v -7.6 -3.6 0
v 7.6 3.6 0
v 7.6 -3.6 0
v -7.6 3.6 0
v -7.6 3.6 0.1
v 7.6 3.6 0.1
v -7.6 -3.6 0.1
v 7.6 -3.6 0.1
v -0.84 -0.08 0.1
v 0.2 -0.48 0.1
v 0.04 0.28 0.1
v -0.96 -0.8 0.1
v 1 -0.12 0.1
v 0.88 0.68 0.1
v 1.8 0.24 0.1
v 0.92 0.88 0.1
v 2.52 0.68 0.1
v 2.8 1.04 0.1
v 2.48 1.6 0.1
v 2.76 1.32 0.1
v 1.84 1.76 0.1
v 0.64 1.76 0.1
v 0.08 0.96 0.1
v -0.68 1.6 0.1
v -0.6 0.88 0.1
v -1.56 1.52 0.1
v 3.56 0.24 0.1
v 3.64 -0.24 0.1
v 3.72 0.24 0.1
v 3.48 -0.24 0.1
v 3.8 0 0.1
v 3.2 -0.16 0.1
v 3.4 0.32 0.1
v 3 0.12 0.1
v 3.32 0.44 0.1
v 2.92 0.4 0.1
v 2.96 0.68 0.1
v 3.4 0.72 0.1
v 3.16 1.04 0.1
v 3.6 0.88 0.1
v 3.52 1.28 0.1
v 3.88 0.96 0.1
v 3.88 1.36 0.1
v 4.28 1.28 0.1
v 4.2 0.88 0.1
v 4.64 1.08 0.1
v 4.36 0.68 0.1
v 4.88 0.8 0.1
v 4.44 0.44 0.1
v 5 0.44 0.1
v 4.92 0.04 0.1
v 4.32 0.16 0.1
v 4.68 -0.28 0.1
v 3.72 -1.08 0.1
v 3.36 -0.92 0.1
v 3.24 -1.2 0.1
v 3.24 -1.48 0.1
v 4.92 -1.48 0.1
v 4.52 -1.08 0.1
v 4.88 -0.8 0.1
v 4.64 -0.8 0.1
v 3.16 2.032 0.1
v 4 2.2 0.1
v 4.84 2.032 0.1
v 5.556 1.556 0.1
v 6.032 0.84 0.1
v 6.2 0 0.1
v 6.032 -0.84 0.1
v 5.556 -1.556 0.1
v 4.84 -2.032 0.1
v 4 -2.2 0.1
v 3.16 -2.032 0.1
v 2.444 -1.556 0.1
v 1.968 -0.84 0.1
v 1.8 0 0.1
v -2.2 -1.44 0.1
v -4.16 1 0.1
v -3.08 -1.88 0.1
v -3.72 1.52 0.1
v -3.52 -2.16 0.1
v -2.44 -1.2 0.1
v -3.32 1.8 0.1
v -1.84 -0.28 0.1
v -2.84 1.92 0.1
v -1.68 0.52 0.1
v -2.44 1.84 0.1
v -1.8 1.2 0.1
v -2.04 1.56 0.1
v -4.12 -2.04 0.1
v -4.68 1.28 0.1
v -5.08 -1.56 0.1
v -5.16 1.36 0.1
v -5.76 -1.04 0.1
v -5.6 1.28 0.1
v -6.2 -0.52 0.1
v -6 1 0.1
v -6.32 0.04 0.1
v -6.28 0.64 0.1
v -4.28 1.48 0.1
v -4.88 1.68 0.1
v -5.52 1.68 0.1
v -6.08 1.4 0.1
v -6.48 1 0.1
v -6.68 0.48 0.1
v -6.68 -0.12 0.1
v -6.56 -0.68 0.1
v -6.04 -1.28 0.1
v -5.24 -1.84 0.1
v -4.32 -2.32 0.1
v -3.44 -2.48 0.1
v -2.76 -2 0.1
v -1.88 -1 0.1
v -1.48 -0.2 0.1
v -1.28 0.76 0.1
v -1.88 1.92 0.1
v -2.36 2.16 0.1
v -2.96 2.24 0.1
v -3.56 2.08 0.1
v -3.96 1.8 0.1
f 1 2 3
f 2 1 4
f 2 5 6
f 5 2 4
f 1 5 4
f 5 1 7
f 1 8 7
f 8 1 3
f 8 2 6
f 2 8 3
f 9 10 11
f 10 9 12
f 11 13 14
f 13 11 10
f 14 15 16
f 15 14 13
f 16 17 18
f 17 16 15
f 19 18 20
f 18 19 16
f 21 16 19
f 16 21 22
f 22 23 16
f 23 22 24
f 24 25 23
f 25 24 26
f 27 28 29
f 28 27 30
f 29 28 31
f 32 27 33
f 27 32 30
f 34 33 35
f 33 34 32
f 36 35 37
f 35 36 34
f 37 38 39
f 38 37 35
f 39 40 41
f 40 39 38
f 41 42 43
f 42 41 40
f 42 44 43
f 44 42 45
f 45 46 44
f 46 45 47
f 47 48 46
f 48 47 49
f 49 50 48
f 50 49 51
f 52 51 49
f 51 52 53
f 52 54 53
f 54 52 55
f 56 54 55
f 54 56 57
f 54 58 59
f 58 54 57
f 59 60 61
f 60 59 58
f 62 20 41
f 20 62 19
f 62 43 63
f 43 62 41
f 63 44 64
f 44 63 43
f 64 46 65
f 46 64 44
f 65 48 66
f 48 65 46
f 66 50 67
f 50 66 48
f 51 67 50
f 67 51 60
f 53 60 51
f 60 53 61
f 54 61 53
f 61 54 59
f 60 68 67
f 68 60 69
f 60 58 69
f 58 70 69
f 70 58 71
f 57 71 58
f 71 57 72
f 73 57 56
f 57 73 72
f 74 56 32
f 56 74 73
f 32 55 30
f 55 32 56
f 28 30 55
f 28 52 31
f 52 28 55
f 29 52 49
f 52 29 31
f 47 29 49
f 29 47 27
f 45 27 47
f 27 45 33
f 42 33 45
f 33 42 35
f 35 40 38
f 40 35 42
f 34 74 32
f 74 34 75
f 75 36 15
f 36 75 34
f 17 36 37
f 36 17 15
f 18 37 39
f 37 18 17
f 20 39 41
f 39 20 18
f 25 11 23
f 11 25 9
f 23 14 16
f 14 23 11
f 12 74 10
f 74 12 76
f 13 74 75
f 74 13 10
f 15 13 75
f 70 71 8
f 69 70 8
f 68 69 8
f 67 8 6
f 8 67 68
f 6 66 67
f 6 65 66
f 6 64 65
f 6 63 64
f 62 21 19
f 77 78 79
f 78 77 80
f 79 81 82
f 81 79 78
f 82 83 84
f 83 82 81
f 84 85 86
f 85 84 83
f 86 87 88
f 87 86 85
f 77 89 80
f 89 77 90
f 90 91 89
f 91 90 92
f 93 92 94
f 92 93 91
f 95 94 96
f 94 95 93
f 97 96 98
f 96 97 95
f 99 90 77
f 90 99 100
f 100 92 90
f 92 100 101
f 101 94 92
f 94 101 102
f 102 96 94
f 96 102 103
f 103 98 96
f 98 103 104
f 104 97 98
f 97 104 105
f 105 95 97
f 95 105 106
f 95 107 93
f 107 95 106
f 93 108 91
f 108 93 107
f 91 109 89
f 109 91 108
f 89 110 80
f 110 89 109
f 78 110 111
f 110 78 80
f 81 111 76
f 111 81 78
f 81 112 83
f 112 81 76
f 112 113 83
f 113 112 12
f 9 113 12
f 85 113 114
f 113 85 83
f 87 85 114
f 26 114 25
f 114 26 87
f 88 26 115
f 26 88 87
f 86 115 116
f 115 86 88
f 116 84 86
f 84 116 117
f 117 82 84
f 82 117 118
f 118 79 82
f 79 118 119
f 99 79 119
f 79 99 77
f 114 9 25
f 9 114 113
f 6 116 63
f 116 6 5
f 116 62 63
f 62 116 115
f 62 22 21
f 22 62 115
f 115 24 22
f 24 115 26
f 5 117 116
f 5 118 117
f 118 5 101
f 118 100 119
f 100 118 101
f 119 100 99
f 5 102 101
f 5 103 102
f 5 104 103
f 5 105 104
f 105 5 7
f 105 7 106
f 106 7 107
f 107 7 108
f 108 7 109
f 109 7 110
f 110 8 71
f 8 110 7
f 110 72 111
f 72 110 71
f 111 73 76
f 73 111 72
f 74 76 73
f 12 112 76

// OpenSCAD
// file: ../p/box5-12.scad
use <../lib.scad>
function ldraw_lib__box5_12() = [
// 0 Box with 5 Faces without Any Edges
// 0 Name: box5-12.dat
// 0 Author: Chris Dee [cwdee]
// 0 !LDRAW_ORG Primitive UPDATE 2009-02
// 0 !LICENSE Licensed under CC BY 4.0 : see CAreadme.txt
// 
// 0 BFC CERTIFY CCW
  [0,"BFC","CERTIFY"],
  [0,"BFC","CCW"],
// 
// 0 !HISTORY 2009-09-03 [PTadmin] Official Update 2009-02
// 
// 
// 4 16 1 1 1 1 1 -1 -1 1 -1 -1 1 1
  [4,16,1,1,1,1,1,-1,-1,1,-1,-1,1,1],
// 4 16 -1 0 1 1 0 1 1 1 1 -1 1 1
  [4,16,-1,0,1,1,0,1,1,1,1,-1,1,1],
// 4 16 -1 0 -1 -1 0 1 -1 1 1 -1 1 -1
  [4,16,-1,0,-1,-1,0,1,-1,1,1,-1,1,-1],
// 4 16 1 0 -1 -1 0 -1 -1 1 -1 1 1 -1
  [4,16,1,0,-1,-1,0,-1,-1,1,-1,1,1,-1],
// 4 16 1 0 1 1 0 -1 1 1 -1 1 1 1
  [4,16,1,0,1,1,0,-1,1,1,-1,1,1,1],
// 0
];
module ldraw_lib__box5_12(step=0, col=false, unit=2/5, alt=false, line=0.2, solid=!$preview)
    makepoly(ldraw_lib__box5_12(), step=step, col=col, unit=unit, alt=alt, line=line, solid=solid);
ldraw_lib__box5_12(line=0.2);
// main file
use <../lib.scad>
use <../p/box5-12.scad>
function ldraw_lib__6018377e() = [
// 0 Sticker  0.9 x  1.9 with Heart and Medium Lavender "2" in White Circle on Lime Background
// 0 Name: 6018377e.dat
// 0 Author: Takeshi Takahashi [RainbowDolphin]
// 0 !LDRAW_ORG Part UPDATE 2025-07
// 0 !LICENSE Licensed under CC BY 4.0 : see CAreadme.txt
// 
// 0 BFC CERTIFY CCW
  [0,"BFC","CERTIFY"],
  [0,"BFC","CCW"],
// 
// 0 !KEYWORDS Pet salon, Price card, Set 41007
// 
// 0 !HISTORY 2025-07-27 [OrionP] Official Update 2025-07
// 
// 
// 1 16 0 -0.25 0 19 0 0 0 0.25 0 0 0 9 box5-12.dat
  [1,16,0,-0.25,0,19,0,0,0,0.25,0,0,0,9, ldraw_lib__box5_12()],
// 4 80 -2.1 -0.25 -0.2 -2.4 -0.25 -2 0.5 -0.25 -1.2 0.1 -0.25 0.7
  [4,80,-2.1,-0.25,-0.2,-2.4,-0.25,-2,0.5,-0.25,-1.2,0.1,-0.25,0.7],
// 4 80 0.1 -0.25 0.7 0.5 -0.25 -1.2 2.5 -0.25 -0.3 2.2 -0.25 1.7
  [4,80,0.1,-0.25,0.7,0.5,-0.25,-1.2,2.5,-0.25,-0.3,2.2,-0.25,1.7],
// 4 80 2.2 -0.25 1.7 2.5 -0.25 -0.3 4.5 -0.25 0.6 2.3 -0.25 2.2
  [4,80,2.2,-0.25,1.7,2.5,-0.25,-0.3,4.5,-0.25,0.6,2.3,-0.25,2.2],
// 4 80 2.3 -0.25 2.2 4.5 -0.25 0.6 6.3 -0.25 1.7 7 -0.25 2.6
  [4,80,2.3,-0.25,2.2,4.5,-0.25,0.6,6.3,-0.25,1.7,7,-0.25,2.6],
// 4 80 2.3 -0.25 2.2 7 -0.25 2.6 6.9 -0.25 3.3 6.2 -0.25 4
  [4,80,2.3,-0.25,2.2,7,-0.25,2.6,6.9,-0.25,3.3,6.2,-0.25,4],
// 4 80 2.3 -0.25 2.2 6.2 -0.25 4 4.6 -0.25 4.4 1.6 -0.25 4.4
  [4,80,2.3,-0.25,2.2,6.2,-0.25,4,4.6,-0.25,4.4,1.6,-0.25,4.4],
// 4 80 0.2 -0.25 2.4 2.3 -0.25 2.2 1.6 -0.25 4.4 -1.7 -0.25 4
  [4,80,0.2,-0.25,2.4,2.3,-0.25,2.2,1.6,-0.25,4.4,-1.7,-0.25,4],
// 4 80 -1.5 -0.25 2.2 0.2 -0.25 2.4 -1.7 -0.25 4 -3.9 -0.25 3.8
  [4,80,-1.5,-0.25,2.2,0.2,-0.25,2.4,-1.7,-0.25,4,-3.9,-0.25,3.8],
// 4 30 8.9 -0.25 0.6 8.7 -0.25 -0.6 9.1 -0.25 -0.6 9.3 -0.25 0.6
  [4,30,8.9,-0.25,0.6,8.7,-0.25,-0.6,9.1,-0.25,-0.6,9.3,-0.25,0.6],
// 3 30 9.3 -0.25 0.6 9.1 -0.25 -0.6 9.5 -0.25 0
  [3,30,9.3,-0.25,0.6,9.1,-0.25,-0.6,9.5,-0.25,0],
// 4 30 8 -0.25 -0.4 8.7 -0.25 -0.6 8.9 -0.25 0.6 8.5 -0.25 0.8
  [4,30,8,-0.25,-0.4,8.7,-0.25,-0.6,8.9,-0.25,0.6,8.5,-0.25,0.8],
// 4 30 7.5 -0.25 0.3 8 -0.25 -0.4 8.5 -0.25 0.8 8.3 -0.25 1.1
  [4,30,7.5,-0.25,0.3,8,-0.25,-0.4,8.5,-0.25,0.8,8.3,-0.25,1.1],
// 4 30 7.3 -0.25 1 7.5 -0.25 0.3 8.3 -0.25 1.1 7.4 -0.25 1.7
  [4,30,7.3,-0.25,1,7.5,-0.25,0.3,8.3,-0.25,1.1,7.4,-0.25,1.7],
// 4 30 7.4 -0.25 1.7 8.3 -0.25 1.1 8.5 -0.25 1.8 7.9 -0.25 2.6
  [4,30,7.4,-0.25,1.7,8.3,-0.25,1.1,8.5,-0.25,1.8,7.9,-0.25,2.6],
// 4 30 7.9 -0.25 2.6 8.5 -0.25 1.8 9 -0.25 2.2 8.8 -0.25 3.2
  [4,30,7.9,-0.25,2.6,8.5,-0.25,1.8,9,-0.25,2.2,8.8,-0.25,3.2],
// 4 30 8.8 -0.25 3.2 9 -0.25 2.2 9.7 -0.25 2.4 9.7 -0.25 3.4
  [4,30,8.8,-0.25,3.2,9,-0.25,2.2,9.7,-0.25,2.4,9.7,-0.25,3.4],
// 4 30 10.7 -0.25 3.2 9.7 -0.25 3.4 9.7 -0.25 2.4 10.5 -0.25 2.2
  [4,30,10.7,-0.25,3.2,9.7,-0.25,3.4,9.7,-0.25,2.4,10.5,-0.25,2.2],
// 4 30 11.6 -0.25 2.7 10.7 -0.25 3.2 10.5 -0.25 2.2 10.9 -0.25 1.7
  [4,30,11.6,-0.25,2.7,10.7,-0.25,3.2,10.5,-0.25,2.2,10.9,-0.25,1.7],
// 4 30 12.2 -0.25 2 11.6 -0.25 2.7 10.9 -0.25 1.7 11.1 -0.25 1.1
  [4,30,12.2,-0.25,2,11.6,-0.25,2.7,10.9,-0.25,1.7,11.1,-0.25,1.1],
// 4 30 12.5 -0.25 1.1 12.2 -0.25 2 11.1 -0.25 1.1 12.3 -0.25 0.1
  [4,30,12.5,-0.25,1.1,12.2,-0.25,2,11.1,-0.25,1.1,12.3,-0.25,0.1],
// 4 30 12.3 -0.25 0.1 11.1 -0.25 1.1 10.8 -0.25 0.4 11.7 -0.25 -0.7
  [4,30,12.3,-0.25,0.1,11.1,-0.25,1.1,10.8,-0.25,0.4,11.7,-0.25,-0.7],
// 4 30 9.3 -0.25 -2.7 11.7 -0.25 -0.7 10.8 -0.25 0.4 8.4 -0.25 -2.3
  [4,30,9.3,-0.25,-2.7,11.7,-0.25,-0.7,10.8,-0.25,0.4,8.4,-0.25,-2.3],
// 4 30 9.3 -0.25 -2.7 8.4 -0.25 -2.3 8.1 -0.25 -3 8.1 -0.25 -3.7
  [4,30,9.3,-0.25,-2.7,8.4,-0.25,-2.3,8.1,-0.25,-3,8.1,-0.25,-3.7],
// 4 30 9.3 -0.25 -2.7 8.1 -0.25 -3.7 12.3 -0.25 -3.7 11.3 -0.25 -2.7
  [4,30,9.3,-0.25,-2.7,8.1,-0.25,-3.7,12.3,-0.25,-3.7,11.3,-0.25,-2.7],
// 4 30 11.3 -0.25 -2.7 12.3 -0.25 -3.7 12.2 -0.25 -2 11.6 -0.25 -2
  [4,30,11.3,-0.25,-2.7,12.3,-0.25,-3.7,12.2,-0.25,-2,11.6,-0.25,-2],
// 4 15 7.9 -0.25 5.08 6.2 -0.25 4 6.9 -0.25 3.3 8.8 -0.25 3.2
  [4,15,7.9,-0.25,5.08,6.2,-0.25,4,6.9,-0.25,3.3,8.8,-0.25,3.2],
// 4 15 10 -0.25 5.5 7.9 -0.25 5.08 8.8 -0.25 3.2 9.7 -0.25 3.4
  [4,15,10,-0.25,5.5,7.9,-0.25,5.08,8.8,-0.25,3.2,9.7,-0.25,3.4],
// 4 15 10 -0.25 5.5 9.7 -0.25 3.4 10.7 -0.25 3.2 12.1 -0.25 5.08
  [4,15,10,-0.25,5.5,9.7,-0.25,3.4,10.7,-0.25,3.2,12.1,-0.25,5.08],
// 4 15 12.1 -0.25 5.08 10.7 -0.25 3.2 11.6 -0.25 2.7 13.89 -0.25 3.89
  [4,15,12.1,-0.25,5.08,10.7,-0.25,3.2,11.6,-0.25,2.7,13.89,-0.25,3.89],
// 4 15 13.89 -0.25 3.89 11.6 -0.25 2.7 12.2 -0.25 2 15.08 -0.25 2.1
  [4,15,13.89,-0.25,3.89,11.6,-0.25,2.7,12.2,-0.25,2,15.08,-0.25,2.1],
// 4 15 15.08 -0.25 2.1 12.2 -0.25 2 12.5 -0.25 1.1 15.5 -0.25 0
  [4,15,15.08,-0.25,2.1,12.2,-0.25,2,12.5,-0.25,1.1,15.5,-0.25,0],
// 4 15 15.5 -0.25 0 12.5 -0.25 1.1 12.3 -0.25 0.1 12.2 -0.25 -2
  [4,15,15.5,-0.25,0,12.5,-0.25,1.1,12.3,-0.25,0.1,12.2,-0.25,-2],
// 4 15 12.2 -0.25 -2 12.3 -0.25 0.1 11.7 -0.25 -0.7 11.6 -0.25 -2
  [4,15,12.2,-0.25,-2,12.3,-0.25,0.1,11.7,-0.25,-0.7,11.6,-0.25,-2],
// 4 15 11.6 -0.25 -2 11.7 -0.25 -0.7 9.3 -0.25 -2.7 11.3 -0.25 -2.7
  [4,15,11.6,-0.25,-2,11.7,-0.25,-0.7,9.3,-0.25,-2.7,11.3,-0.25,-2.7],
// 4 15 15.08 -0.25 -2.1 15.5 -0.25 0 12.2 -0.25 -2 13.89 -0.25 -3.89
  [4,15,15.08,-0.25,-2.1,15.5,-0.25,0,12.2,-0.25,-2,13.89,-0.25,-3.89],
// 3 15 12.2 -0.25 -2 12.3 -0.25 -3.7 13.89 -0.25 -3.89
  [3,15,12.2,-0.25,-2,12.3,-0.25,-3.7,13.89,-0.25,-3.89],
// 4 15 12.1 -0.25 -5.08 13.89 -0.25 -3.89 12.3 -0.25 -3.7 10 -0.25 -5.5
  [4,15,12.1,-0.25,-5.08,13.89,-0.25,-3.89,12.3,-0.25,-3.7,10,-0.25,-5.5],
// 4 15 10 -0.25 -5.5 12.3 -0.25 -3.7 8.1 -0.25 -3.7 7.9 -0.25 -5.08
  [4,15,10,-0.25,-5.5,12.3,-0.25,-3.7,8.1,-0.25,-3.7,7.9,-0.25,-5.08],
// 4 15 6.11 -0.25 -3.89 7.9 -0.25 -5.08 8.1 -0.25 -3.7 8.1 -0.25 -3
  [4,15,6.11,-0.25,-3.89,7.9,-0.25,-5.08,8.1,-0.25,-3.7,8.1,-0.25,-3],
// 4 15 4.92 -0.25 -2.1 6.11 -0.25 -3.89 8.1 -0.25 -3 8 -0.25 -0.4
  [4,15,4.92,-0.25,-2.1,6.11,-0.25,-3.89,8.1,-0.25,-3,8,-0.25,-0.4],
// 4 15 8 -0.25 -0.4 8.1 -0.25 -3 8.4 -0.25 -2.3 8.7 -0.25 -0.6
  [4,15,8,-0.25,-0.4,8.1,-0.25,-3,8.4,-0.25,-2.3,8.7,-0.25,-0.6],
// 3 15 9.1 -0.25 -0.6 8.7 -0.25 -0.6 8.4 -0.25 -2.3
  [3,15,9.1,-0.25,-0.6,8.7,-0.25,-0.6,8.4,-0.25,-2.3],
// 4 15 9.1 -0.25 -0.6 8.4 -0.25 -2.3 10.8 -0.25 0.4 9.5 -0.25 0
  [4,15,9.1,-0.25,-0.6,8.4,-0.25,-2.3,10.8,-0.25,0.4,9.5,-0.25,0],
// 4 15 9.5 -0.25 0 10.8 -0.25 0.4 11.1 -0.25 1.1 9.3 -0.25 0.6
  [4,15,9.5,-0.25,0,10.8,-0.25,0.4,11.1,-0.25,1.1,9.3,-0.25,0.6],
// 4 15 9.3 -0.25 0.6 11.1 -0.25 1.1 10.9 -0.25 1.7 8.9 -0.25 0.6
  [4,15,9.3,-0.25,0.6,11.1,-0.25,1.1,10.9,-0.25,1.7,8.9,-0.25,0.6],
// 4 15 8.9 -0.25 0.6 10.9 -0.25 1.7 10.5 -0.25 2.2 8.5 -0.25 0.8
  [4,15,8.9,-0.25,0.6,10.9,-0.25,1.7,10.5,-0.25,2.2,8.5,-0.25,0.8],
// 4 15 8.5 -0.25 0.8 10.5 -0.25 2.2 9.7 -0.25 2.4 8.3 -0.25 1.1
  [4,15,8.5,-0.25,0.8,10.5,-0.25,2.2,9.7,-0.25,2.4,8.3,-0.25,1.1],
// 4 15 8.3 -0.25 1.1 9.7 -0.25 2.4 9 -0.25 2.2 8.5 -0.25 1.8
  [4,15,8.3,-0.25,1.1,9.7,-0.25,2.4,9,-0.25,2.2,8.5,-0.25,1.8],
// 4 15 4.5 -0.25 0 4.92 -0.25 -2.1 8 -0.25 -0.4 7.5 -0.25 0.3
  [4,15,4.5,-0.25,0,4.92,-0.25,-2.1,8,-0.25,-0.4,7.5,-0.25,0.3],
// 4 15 4.5 -0.25 0.6 4.5 -0.25 0 7.5 -0.25 0.3 7.3 -0.25 1
  [4,15,4.5,-0.25,0.6,4.5,-0.25,0,7.5,-0.25,0.3,7.3,-0.25,1],
// 4 15 6.3 -0.25 1.7 4.5 -0.25 0.6 7.3 -0.25 1 7.4 -0.25 1.7
  [4,15,6.3,-0.25,1.7,4.5,-0.25,0.6,7.3,-0.25,1,7.4,-0.25,1.7],
// 4 15 7 -0.25 2.6 6.3 -0.25 1.7 7.4 -0.25 1.7 7.9 -0.25 2.6
  [4,15,7,-0.25,2.6,6.3,-0.25,1.7,7.4,-0.25,1.7,7.9,-0.25,2.6],
// 4 15 6.9 -0.25 3.3 7 -0.25 2.6 7.9 -0.25 2.6 8.8 -0.25 3.2
  [4,15,6.9,-0.25,3.3,7,-0.25,2.6,7.9,-0.25,2.6,8.8,-0.25,3.2],
// 4 27 -1.5 -0.25 2.2 -2.1 -0.25 -0.2 0.1 -0.25 0.7 0.2 -0.25 2.4
  [4,27,-1.5,-0.25,2.2,-2.1,-0.25,-0.2,0.1,-0.25,0.7,0.2,-0.25,2.4],
// 4 27 0.2 -0.25 2.4 0.1 -0.25 0.7 2.2 -0.25 1.7 2.3 -0.25 2.2
  [4,27,0.2,-0.25,2.4,0.1,-0.25,0.7,2.2,-0.25,1.7,2.3,-0.25,2.2],
// 4 27 4.92 -0.25 -2.1 0.5 -0.25 -1.2 -2.4 -0.25 -2 -5.5 -0.25 -3.6
  [4,27,4.92,-0.25,-2.1,0.5,-0.25,-1.2,-2.4,-0.25,-2,-5.5,-0.25,-3.6],
// 4 27 2.5 -0.25 -0.3 0.5 -0.25 -1.2 4.92 -0.25 -2.1 4.5 -0.25 0
  [4,27,2.5,-0.25,-0.3,0.5,-0.25,-1.2,4.92,-0.25,-2.1,4.5,-0.25,0],
// 3 27 4.5 -0.25 0.6 2.5 -0.25 -0.3 4.5 -0.25 0
  [3,27,4.5,-0.25,0.6,2.5,-0.25,-0.3,4.5,-0.25,0],
// 3 27 12.1 -0.25 -5.08 10 -0.25 -5.5 19 -0.25 -9
  [3,27,12.1,-0.25,-5.08,10,-0.25,-5.5,19,-0.25,-9],
// 3 27 13.89 -0.25 -3.89 12.1 -0.25 -5.08 19 -0.25 -9
  [3,27,13.89,-0.25,-3.89,12.1,-0.25,-5.08,19,-0.25,-9],
// 3 27 15.08 -0.25 -2.1 13.89 -0.25 -3.89 19 -0.25 -9
  [3,27,15.08,-0.25,-2.1,13.89,-0.25,-3.89,19,-0.25,-9],
// 4 27 15.5 -0.25 0 15.08 -0.25 -2.1 19 -0.25 -9 19 -0.25 9
  [4,27,15.5,-0.25,0,15.08,-0.25,-2.1,19,-0.25,-9,19,-0.25,9],
// 3 27 19 -0.25 9 15.08 -0.25 2.1 15.5 -0.25 0
  [3,27,19,-0.25,9,15.08,-0.25,2.1,15.5,-0.25,0],
// 3 27 19 -0.25 9 13.89 -0.25 3.89 15.08 -0.25 2.1
  [3,27,19,-0.25,9,13.89,-0.25,3.89,15.08,-0.25,2.1],
// 3 27 19 -0.25 9 12.1 -0.25 5.08 13.89 -0.25 3.89
  [3,27,19,-0.25,9,12.1,-0.25,5.08,13.89,-0.25,3.89],
// 3 27 19 -0.25 9 10 -0.25 5.5 12.1 -0.25 5.08
  [3,27,19,-0.25,9,10,-0.25,5.5,12.1,-0.25,5.08],
// 3 27 7.9 -0.25 5.08 4.6 -0.25 4.4 6.2 -0.25 4
  [3,27,7.9,-0.25,5.08,4.6,-0.25,4.4,6.2,-0.25,4],
// 4 26 -9.3 -0.25 3.8 -10.4 -0.25 2.5 -8.8 -0.25 -5.4 -7.7 -0.25 -4.7
  [4,26,-9.3,-0.25,3.8,-10.4,-0.25,2.5,-8.8,-0.25,-5.4,-7.7,-0.25,-4.7],
// 4 26 -8.3 -0.25 4.5 -9.3 -0.25 3.8 -7.7 -0.25 -4.7 -6.1 -0.25 -3
  [4,26,-8.3,-0.25,4.5,-9.3,-0.25,3.8,-7.7,-0.25,-4.7,-6.1,-0.25,-3],
// 4 26 -7.1 -0.25 4.8 -8.3 -0.25 4.5 -6.1 -0.25 -3 -4.6 -0.25 -0.7
  [4,26,-7.1,-0.25,4.8,-8.3,-0.25,4.5,-6.1,-0.25,-3,-4.6,-0.25,-0.7],
// 4 26 -6.1 -0.25 4.6 -7.1 -0.25 4.8 -4.6 -0.25 -0.7 -4.2 -0.25 1.3
  [4,26,-6.1,-0.25,4.6,-7.1,-0.25,4.8,-4.6,-0.25,-0.7,-4.2,-0.25,1.3],
// 4 26 -5.1 -0.25 3.9 -6.1 -0.25 4.6 -4.2 -0.25 1.3 -4.5 -0.25 3
  [4,26,-5.1,-0.25,3.9,-6.1,-0.25,4.6,-4.2,-0.25,1.3,-4.5,-0.25,3],
// 4 26 -10.3 -0.25 -5.1 -8.8 -0.25 -5.4 -10.4 -0.25 2.5 -11.7 -0.25 3.2
  [4,26,-10.3,-0.25,-5.1,-8.8,-0.25,-5.4,-10.4,-0.25,2.5,-11.7,-0.25,3.2],
// 4 26 -12.7 -0.25 -3.9 -10.3 -0.25 -5.1 -11.7 -0.25 3.2 -12.9 -0.25 3.4
  [4,26,-12.7,-0.25,-3.9,-10.3,-0.25,-5.1,-11.7,-0.25,3.2,-12.9,-0.25,3.4],
// 4 26 -14.4 -0.25 -2.6 -12.7 -0.25 -3.9 -12.9 -0.25 3.4 -14 -0.25 3.2
  [4,26,-14.4,-0.25,-2.6,-12.7,-0.25,-3.9,-12.9,-0.25,3.4,-14,-0.25,3.2],
// 4 26 -15.5 -0.25 -1.3 -14.4 -0.25 -2.6 -14 -0.25 3.2 -15 -0.25 2.5
  [4,26,-15.5,-0.25,-1.3,-14.4,-0.25,-2.6,-14,-0.25,3.2,-15,-0.25,2.5],
// 4 26 -15.8 -0.25 0.1 -15.5 -0.25 -1.3 -15 -0.25 2.5 -15.7 -0.25 1.6
  [4,26,-15.8,-0.25,0.1,-15.5,-0.25,-1.3,-15,-0.25,2.5,-15.7,-0.25,1.6],
// 4 80 -11.7 -0.25 3.2 -10.4 -0.25 2.5 -10.7 -0.25 3.7 -12.2 -0.25 4.2
  [4,80,-11.7,-0.25,3.2,-10.4,-0.25,2.5,-10.7,-0.25,3.7,-12.2,-0.25,4.2],
// 4 80 -12.9 -0.25 3.4 -11.7 -0.25 3.2 -12.2 -0.25 4.2 -13.8 -0.25 4.2
  [4,80,-12.9,-0.25,3.4,-11.7,-0.25,3.2,-12.2,-0.25,4.2,-13.8,-0.25,4.2],
// 4 80 -14 -0.25 3.2 -12.9 -0.25 3.4 -13.8 -0.25 4.2 -15.2 -0.25 3.5
  [4,80,-14,-0.25,3.2,-12.9,-0.25,3.4,-13.8,-0.25,4.2,-15.2,-0.25,3.5],
// 4 80 -15 -0.25 2.5 -14 -0.25 3.2 -15.2 -0.25 3.5 -16.2 -0.25 2.5
  [4,80,-15,-0.25,2.5,-14,-0.25,3.2,-15.2,-0.25,3.5,-16.2,-0.25,2.5],
// 4 80 -15.7 -0.25 1.6 -15 -0.25 2.5 -16.2 -0.25 2.5 -16.7 -0.25 1.2
  [4,80,-15.7,-0.25,1.6,-15,-0.25,2.5,-16.2,-0.25,2.5,-16.7,-0.25,1.2],
// 4 80 -15.8 -0.25 0.1 -15.7 -0.25 1.6 -16.7 -0.25 1.2 -16.7 -0.25 -0.3
  [4,80,-15.8,-0.25,0.1,-15.7,-0.25,1.6,-16.7,-0.25,1.2,-16.7,-0.25,-0.3],
// 4 80 -15.5 -0.25 -1.3 -15.8 -0.25 0.1 -16.7 -0.25 -0.3 -16.4 -0.25 -1.7
  [4,80,-15.5,-0.25,-1.3,-15.8,-0.25,0.1,-16.7,-0.25,-0.3,-16.4,-0.25,-1.7],
// 4 80 -14.4 -0.25 -2.6 -15.5 -0.25 -1.3 -16.4 -0.25 -1.7 -15.1 -0.25 -3.2
  [4,80,-14.4,-0.25,-2.6,-15.5,-0.25,-1.3,-16.4,-0.25,-1.7,-15.1,-0.25,-3.2],
// 4 80 -12.7 -0.25 -3.9 -14.4 -0.25 -2.6 -15.1 -0.25 -3.2 -13.1 -0.25 -4.6
  [4,80,-12.7,-0.25,-3.9,-14.4,-0.25,-2.6,-15.1,-0.25,-3.2,-13.1,-0.25,-4.6],
// 4 80 -10.3 -0.25 -5.1 -12.7 -0.25 -3.9 -13.1 -0.25 -4.6 -10.8 -0.25 -5.8
  [4,80,-10.3,-0.25,-5.1,-12.7,-0.25,-3.9,-13.1,-0.25,-4.6,-10.8,-0.25,-5.8],
// 4 80 -8.8 -0.25 -5.4 -10.3 -0.25 -5.1 -10.8 -0.25 -5.8 -8.6 -0.25 -6.2
  [4,80,-8.8,-0.25,-5.4,-10.3,-0.25,-5.1,-10.8,-0.25,-5.8,-8.6,-0.25,-6.2],
// 4 80 -7.7 -0.25 -4.7 -8.8 -0.25 -5.4 -8.6 -0.25 -6.2 -6.9 -0.25 -5
  [4,80,-7.7,-0.25,-4.7,-8.8,-0.25,-5.4,-8.6,-0.25,-6.2,-6.9,-0.25,-5],
// 4 80 -6.1 -0.25 -3 -7.7 -0.25 -4.7 -6.9 -0.25 -5 -5.5 -0.25 -3.6
  [4,80,-6.1,-0.25,-3,-7.7,-0.25,-4.7,-6.9,-0.25,-5,-5.5,-0.25,-3.6],
// 4 80 -6.1 -0.25 -3 -5.5 -0.25 -3.6 -4.7 -0.25 -2.5 -4.6 -0.25 -0.7
  [4,80,-6.1,-0.25,-3,-5.5,-0.25,-3.6,-4.7,-0.25,-2.5,-4.6,-0.25,-0.7],
// 4 80 -4.6 -0.25 -0.7 -4.7 -0.25 -2.5 -2.4 -0.25 -2 -3.7 -0.25 -0.5
  [4,80,-4.6,-0.25,-0.7,-4.7,-0.25,-2.5,-2.4,-0.25,-2,-3.7,-0.25,-0.5],
// 3 80 -2.1 -0.25 -0.2 -3.7 -0.25 -0.5 -2.4 -0.25 -2
  [3,80,-2.1,-0.25,-0.2,-3.7,-0.25,-0.5,-2.4,-0.25,-2],
// 4 80 -4.2 -0.25 1.3 -4.6 -0.25 -0.7 -3.7 -0.25 -0.5 -3.2 -0.25 1.9
  [4,80,-4.2,-0.25,1.3,-4.6,-0.25,-0.7,-3.7,-0.25,-0.5,-3.2,-0.25,1.9],
// 3 80 -4.5 -0.25 3 -4.2 -0.25 1.3 -3.2 -0.25 1.9
  [3,80,-4.5,-0.25,3,-4.2,-0.25,1.3,-3.2,-0.25,1.9],
// 4 80 -4.5 -0.25 3 -3.2 -0.25 1.9 -1.5 -0.25 2.2 -3.9 -0.25 3.8
  [4,80,-4.5,-0.25,3,-3.2,-0.25,1.9,-1.5,-0.25,2.2,-3.9,-0.25,3.8],
// 4 80 -5.1 -0.25 3.9 -4.5 -0.25 3 -3.9 -0.25 3.8 -4.7 -0.25 4.8
  [4,80,-5.1,-0.25,3.9,-4.5,-0.25,3,-3.9,-0.25,3.8,-4.7,-0.25,4.8],
// 4 80 -6.1 -0.25 4.6 -5.1 -0.25 3.9 -4.7 -0.25 4.8 -5.9 -0.25 5.4
  [4,80,-6.1,-0.25,4.6,-5.1,-0.25,3.9,-4.7,-0.25,4.8,-5.9,-0.25,5.4],
// 4 80 -7.1 -0.25 4.8 -6.1 -0.25 4.6 -5.9 -0.25 5.4 -7.4 -0.25 5.6
  [4,80,-7.1,-0.25,4.8,-6.1,-0.25,4.6,-5.9,-0.25,5.4,-7.4,-0.25,5.6],
// 4 80 -8.3 -0.25 4.5 -7.1 -0.25 4.8 -7.4 -0.25 5.6 -8.9 -0.25 5.2
  [4,80,-8.3,-0.25,4.5,-7.1,-0.25,4.8,-7.4,-0.25,5.6,-8.9,-0.25,5.2],
// 4 80 -9.3 -0.25 3.8 -8.3 -0.25 4.5 -8.9 -0.25 5.2 -9.9 -0.25 4.5
  [4,80,-9.3,-0.25,3.8,-8.3,-0.25,4.5,-8.9,-0.25,5.2,-9.9,-0.25,4.5],
// 4 80 -9.3 -0.25 3.8 -9.9 -0.25 4.5 -10.7 -0.25 3.7 -10.4 -0.25 2.5
  [4,80,-9.3,-0.25,3.8,-9.9,-0.25,4.5,-10.7,-0.25,3.7,-10.4,-0.25,2.5],
// 4 27 -3.2 -0.25 1.9 -3.7 -0.25 -0.5 -2.1 -0.25 -0.2 -1.5 -0.25 2.2
  [4,27,-3.2,-0.25,1.9,-3.7,-0.25,-0.5,-2.1,-0.25,-0.2,-1.5,-0.25,2.2],
// 4 27 10 -0.25 5.5 19 -0.25 9 -19 -0.25 9 -5.9 -0.25 5.4
  [4,27,10,-0.25,5.5,19,-0.25,9,-19,-0.25,9,-5.9,-0.25,5.4],
// 4 27 7.9 -0.25 5.08 10 -0.25 5.5 -5.9 -0.25 5.4 -4.7 -0.25 4.8
  [4,27,7.9,-0.25,5.08,10,-0.25,5.5,-5.9,-0.25,5.4,-4.7,-0.25,4.8],
// 4 27 7.9 -0.25 5.08 -4.7 -0.25 4.8 1.6 -0.25 4.4 4.6 -0.25 4.4
  [4,27,7.9,-0.25,5.08,-4.7,-0.25,4.8,1.6,-0.25,4.4,4.6,-0.25,4.4],
// 4 27 -1.7 -0.25 4 1.6 -0.25 4.4 -4.7 -0.25 4.8 -3.9 -0.25 3.8
  [4,27,-1.7,-0.25,4,1.6,-0.25,4.4,-4.7,-0.25,4.8,-3.9,-0.25,3.8],
// 3 27 -19 -0.25 9 -7.4 -0.25 5.6 -5.9 -0.25 5.4
  [3,27,-19,-0.25,9,-7.4,-0.25,5.6,-5.9,-0.25,5.4],
// 4 27 -8.9 -0.25 5.2 -7.4 -0.25 5.6 -19 -0.25 9 -13.8 -0.25 4.2
  [4,27,-8.9,-0.25,5.2,-7.4,-0.25,5.6,-19,-0.25,9,-13.8,-0.25,4.2],
// 4 27 -8.9 -0.25 5.2 -13.8 -0.25 4.2 -12.2 -0.25 4.2 -9.9 -0.25 4.5
  [4,27,-8.9,-0.25,5.2,-13.8,-0.25,4.2,-12.2,-0.25,4.2,-9.9,-0.25,4.5],
// 3 27 -9.9 -0.25 4.5 -12.2 -0.25 4.2 -10.7 -0.25 3.7
  [3,27,-9.9,-0.25,4.5,-12.2,-0.25,4.2,-10.7,-0.25,3.7],
// 3 27 -19 -0.25 9 -15.2 -0.25 3.5 -13.8 -0.25 4.2
  [3,27,-19,-0.25,9,-15.2,-0.25,3.5,-13.8,-0.25,4.2],
// 3 27 -19 -0.25 9 -16.2 -0.25 2.5 -15.2 -0.25 3.5
  [3,27,-19,-0.25,9,-16.2,-0.25,2.5,-15.2,-0.25,3.5],
// 3 27 -19 -0.25 9 -16.7 -0.25 1.2 -16.2 -0.25 2.5
  [3,27,-19,-0.25,9,-16.7,-0.25,1.2,-16.2,-0.25,2.5],
// 4 27 -16.7 -0.25 -0.3 -16.7 -0.25 1.2 -19 -0.25 9 -19 -0.25 -9
  [4,27,-16.7,-0.25,-0.3,-16.7,-0.25,1.2,-19,-0.25,9,-19,-0.25,-9],
// 3 27 -16.7 -0.25 -0.3 -19 -0.25 -9 -16.4 -0.25 -1.7
  [3,27,-16.7,-0.25,-0.3,-19,-0.25,-9,-16.4,-0.25,-1.7],
// 3 27 -16.4 -0.25 -1.7 -19 -0.25 -9 -15.1 -0.25 -3.2
  [3,27,-16.4,-0.25,-1.7,-19,-0.25,-9,-15.1,-0.25,-3.2],
// 3 27 -15.1 -0.25 -3.2 -19 -0.25 -9 -13.1 -0.25 -4.6
  [3,27,-15.1,-0.25,-3.2,-19,-0.25,-9,-13.1,-0.25,-4.6],
// 3 27 -13.1 -0.25 -4.6 -19 -0.25 -9 -10.8 -0.25 -5.8
  [3,27,-13.1,-0.25,-4.6,-19,-0.25,-9,-10.8,-0.25,-5.8],
// 3 27 -10.8 -0.25 -5.8 -19 -0.25 -9 -8.6 -0.25 -6.2
  [3,27,-10.8,-0.25,-5.8,-19,-0.25,-9,-8.6,-0.25,-6.2],
// 4 27 -8.6 -0.25 -6.2 -19 -0.25 -9 19 -0.25 -9 10 -0.25 -5.5
  [4,27,-8.6,-0.25,-6.2,-19,-0.25,-9,19,-0.25,-9,10,-0.25,-5.5],
// 4 27 -8.6 -0.25 -6.2 10 -0.25 -5.5 7.9 -0.25 -5.08 -6.9 -0.25 -5
  [4,27,-8.6,-0.25,-6.2,10,-0.25,-5.5,7.9,-0.25,-5.08,-6.9,-0.25,-5],
// 4 27 -6.9 -0.25 -5 7.9 -0.25 -5.08 6.11 -0.25 -3.89 -5.5 -0.25 -3.6
  [4,27,-6.9,-0.25,-5,7.9,-0.25,-5.08,6.11,-0.25,-3.89,-5.5,-0.25,-3.6],
// 3 27 4.92 -0.25 -2.1 -5.5 -0.25 -3.6 6.11 -0.25 -3.89
  [3,27,4.92,-0.25,-2.1,-5.5,-0.25,-3.6,6.11,-0.25,-3.89],
// 3 27 -2.4 -0.25 -2 -4.7 -0.25 -2.5 -5.5 -0.25 -3.6
  [3,27,-2.4,-0.25,-2,-4.7,-0.25,-2.5,-5.5,-0.25,-3.6],
];
module ldraw_lib__6018377e(step=0, col=false, unit=2/5, alt=false, line=0.2, solid=!$preview)
    makepoly(ldraw_lib__6018377e(), step=step, col=col, unit=unit, alt=alt, line=line, solid=solid);
ldraw_lib__6018377e(line=0.2);
